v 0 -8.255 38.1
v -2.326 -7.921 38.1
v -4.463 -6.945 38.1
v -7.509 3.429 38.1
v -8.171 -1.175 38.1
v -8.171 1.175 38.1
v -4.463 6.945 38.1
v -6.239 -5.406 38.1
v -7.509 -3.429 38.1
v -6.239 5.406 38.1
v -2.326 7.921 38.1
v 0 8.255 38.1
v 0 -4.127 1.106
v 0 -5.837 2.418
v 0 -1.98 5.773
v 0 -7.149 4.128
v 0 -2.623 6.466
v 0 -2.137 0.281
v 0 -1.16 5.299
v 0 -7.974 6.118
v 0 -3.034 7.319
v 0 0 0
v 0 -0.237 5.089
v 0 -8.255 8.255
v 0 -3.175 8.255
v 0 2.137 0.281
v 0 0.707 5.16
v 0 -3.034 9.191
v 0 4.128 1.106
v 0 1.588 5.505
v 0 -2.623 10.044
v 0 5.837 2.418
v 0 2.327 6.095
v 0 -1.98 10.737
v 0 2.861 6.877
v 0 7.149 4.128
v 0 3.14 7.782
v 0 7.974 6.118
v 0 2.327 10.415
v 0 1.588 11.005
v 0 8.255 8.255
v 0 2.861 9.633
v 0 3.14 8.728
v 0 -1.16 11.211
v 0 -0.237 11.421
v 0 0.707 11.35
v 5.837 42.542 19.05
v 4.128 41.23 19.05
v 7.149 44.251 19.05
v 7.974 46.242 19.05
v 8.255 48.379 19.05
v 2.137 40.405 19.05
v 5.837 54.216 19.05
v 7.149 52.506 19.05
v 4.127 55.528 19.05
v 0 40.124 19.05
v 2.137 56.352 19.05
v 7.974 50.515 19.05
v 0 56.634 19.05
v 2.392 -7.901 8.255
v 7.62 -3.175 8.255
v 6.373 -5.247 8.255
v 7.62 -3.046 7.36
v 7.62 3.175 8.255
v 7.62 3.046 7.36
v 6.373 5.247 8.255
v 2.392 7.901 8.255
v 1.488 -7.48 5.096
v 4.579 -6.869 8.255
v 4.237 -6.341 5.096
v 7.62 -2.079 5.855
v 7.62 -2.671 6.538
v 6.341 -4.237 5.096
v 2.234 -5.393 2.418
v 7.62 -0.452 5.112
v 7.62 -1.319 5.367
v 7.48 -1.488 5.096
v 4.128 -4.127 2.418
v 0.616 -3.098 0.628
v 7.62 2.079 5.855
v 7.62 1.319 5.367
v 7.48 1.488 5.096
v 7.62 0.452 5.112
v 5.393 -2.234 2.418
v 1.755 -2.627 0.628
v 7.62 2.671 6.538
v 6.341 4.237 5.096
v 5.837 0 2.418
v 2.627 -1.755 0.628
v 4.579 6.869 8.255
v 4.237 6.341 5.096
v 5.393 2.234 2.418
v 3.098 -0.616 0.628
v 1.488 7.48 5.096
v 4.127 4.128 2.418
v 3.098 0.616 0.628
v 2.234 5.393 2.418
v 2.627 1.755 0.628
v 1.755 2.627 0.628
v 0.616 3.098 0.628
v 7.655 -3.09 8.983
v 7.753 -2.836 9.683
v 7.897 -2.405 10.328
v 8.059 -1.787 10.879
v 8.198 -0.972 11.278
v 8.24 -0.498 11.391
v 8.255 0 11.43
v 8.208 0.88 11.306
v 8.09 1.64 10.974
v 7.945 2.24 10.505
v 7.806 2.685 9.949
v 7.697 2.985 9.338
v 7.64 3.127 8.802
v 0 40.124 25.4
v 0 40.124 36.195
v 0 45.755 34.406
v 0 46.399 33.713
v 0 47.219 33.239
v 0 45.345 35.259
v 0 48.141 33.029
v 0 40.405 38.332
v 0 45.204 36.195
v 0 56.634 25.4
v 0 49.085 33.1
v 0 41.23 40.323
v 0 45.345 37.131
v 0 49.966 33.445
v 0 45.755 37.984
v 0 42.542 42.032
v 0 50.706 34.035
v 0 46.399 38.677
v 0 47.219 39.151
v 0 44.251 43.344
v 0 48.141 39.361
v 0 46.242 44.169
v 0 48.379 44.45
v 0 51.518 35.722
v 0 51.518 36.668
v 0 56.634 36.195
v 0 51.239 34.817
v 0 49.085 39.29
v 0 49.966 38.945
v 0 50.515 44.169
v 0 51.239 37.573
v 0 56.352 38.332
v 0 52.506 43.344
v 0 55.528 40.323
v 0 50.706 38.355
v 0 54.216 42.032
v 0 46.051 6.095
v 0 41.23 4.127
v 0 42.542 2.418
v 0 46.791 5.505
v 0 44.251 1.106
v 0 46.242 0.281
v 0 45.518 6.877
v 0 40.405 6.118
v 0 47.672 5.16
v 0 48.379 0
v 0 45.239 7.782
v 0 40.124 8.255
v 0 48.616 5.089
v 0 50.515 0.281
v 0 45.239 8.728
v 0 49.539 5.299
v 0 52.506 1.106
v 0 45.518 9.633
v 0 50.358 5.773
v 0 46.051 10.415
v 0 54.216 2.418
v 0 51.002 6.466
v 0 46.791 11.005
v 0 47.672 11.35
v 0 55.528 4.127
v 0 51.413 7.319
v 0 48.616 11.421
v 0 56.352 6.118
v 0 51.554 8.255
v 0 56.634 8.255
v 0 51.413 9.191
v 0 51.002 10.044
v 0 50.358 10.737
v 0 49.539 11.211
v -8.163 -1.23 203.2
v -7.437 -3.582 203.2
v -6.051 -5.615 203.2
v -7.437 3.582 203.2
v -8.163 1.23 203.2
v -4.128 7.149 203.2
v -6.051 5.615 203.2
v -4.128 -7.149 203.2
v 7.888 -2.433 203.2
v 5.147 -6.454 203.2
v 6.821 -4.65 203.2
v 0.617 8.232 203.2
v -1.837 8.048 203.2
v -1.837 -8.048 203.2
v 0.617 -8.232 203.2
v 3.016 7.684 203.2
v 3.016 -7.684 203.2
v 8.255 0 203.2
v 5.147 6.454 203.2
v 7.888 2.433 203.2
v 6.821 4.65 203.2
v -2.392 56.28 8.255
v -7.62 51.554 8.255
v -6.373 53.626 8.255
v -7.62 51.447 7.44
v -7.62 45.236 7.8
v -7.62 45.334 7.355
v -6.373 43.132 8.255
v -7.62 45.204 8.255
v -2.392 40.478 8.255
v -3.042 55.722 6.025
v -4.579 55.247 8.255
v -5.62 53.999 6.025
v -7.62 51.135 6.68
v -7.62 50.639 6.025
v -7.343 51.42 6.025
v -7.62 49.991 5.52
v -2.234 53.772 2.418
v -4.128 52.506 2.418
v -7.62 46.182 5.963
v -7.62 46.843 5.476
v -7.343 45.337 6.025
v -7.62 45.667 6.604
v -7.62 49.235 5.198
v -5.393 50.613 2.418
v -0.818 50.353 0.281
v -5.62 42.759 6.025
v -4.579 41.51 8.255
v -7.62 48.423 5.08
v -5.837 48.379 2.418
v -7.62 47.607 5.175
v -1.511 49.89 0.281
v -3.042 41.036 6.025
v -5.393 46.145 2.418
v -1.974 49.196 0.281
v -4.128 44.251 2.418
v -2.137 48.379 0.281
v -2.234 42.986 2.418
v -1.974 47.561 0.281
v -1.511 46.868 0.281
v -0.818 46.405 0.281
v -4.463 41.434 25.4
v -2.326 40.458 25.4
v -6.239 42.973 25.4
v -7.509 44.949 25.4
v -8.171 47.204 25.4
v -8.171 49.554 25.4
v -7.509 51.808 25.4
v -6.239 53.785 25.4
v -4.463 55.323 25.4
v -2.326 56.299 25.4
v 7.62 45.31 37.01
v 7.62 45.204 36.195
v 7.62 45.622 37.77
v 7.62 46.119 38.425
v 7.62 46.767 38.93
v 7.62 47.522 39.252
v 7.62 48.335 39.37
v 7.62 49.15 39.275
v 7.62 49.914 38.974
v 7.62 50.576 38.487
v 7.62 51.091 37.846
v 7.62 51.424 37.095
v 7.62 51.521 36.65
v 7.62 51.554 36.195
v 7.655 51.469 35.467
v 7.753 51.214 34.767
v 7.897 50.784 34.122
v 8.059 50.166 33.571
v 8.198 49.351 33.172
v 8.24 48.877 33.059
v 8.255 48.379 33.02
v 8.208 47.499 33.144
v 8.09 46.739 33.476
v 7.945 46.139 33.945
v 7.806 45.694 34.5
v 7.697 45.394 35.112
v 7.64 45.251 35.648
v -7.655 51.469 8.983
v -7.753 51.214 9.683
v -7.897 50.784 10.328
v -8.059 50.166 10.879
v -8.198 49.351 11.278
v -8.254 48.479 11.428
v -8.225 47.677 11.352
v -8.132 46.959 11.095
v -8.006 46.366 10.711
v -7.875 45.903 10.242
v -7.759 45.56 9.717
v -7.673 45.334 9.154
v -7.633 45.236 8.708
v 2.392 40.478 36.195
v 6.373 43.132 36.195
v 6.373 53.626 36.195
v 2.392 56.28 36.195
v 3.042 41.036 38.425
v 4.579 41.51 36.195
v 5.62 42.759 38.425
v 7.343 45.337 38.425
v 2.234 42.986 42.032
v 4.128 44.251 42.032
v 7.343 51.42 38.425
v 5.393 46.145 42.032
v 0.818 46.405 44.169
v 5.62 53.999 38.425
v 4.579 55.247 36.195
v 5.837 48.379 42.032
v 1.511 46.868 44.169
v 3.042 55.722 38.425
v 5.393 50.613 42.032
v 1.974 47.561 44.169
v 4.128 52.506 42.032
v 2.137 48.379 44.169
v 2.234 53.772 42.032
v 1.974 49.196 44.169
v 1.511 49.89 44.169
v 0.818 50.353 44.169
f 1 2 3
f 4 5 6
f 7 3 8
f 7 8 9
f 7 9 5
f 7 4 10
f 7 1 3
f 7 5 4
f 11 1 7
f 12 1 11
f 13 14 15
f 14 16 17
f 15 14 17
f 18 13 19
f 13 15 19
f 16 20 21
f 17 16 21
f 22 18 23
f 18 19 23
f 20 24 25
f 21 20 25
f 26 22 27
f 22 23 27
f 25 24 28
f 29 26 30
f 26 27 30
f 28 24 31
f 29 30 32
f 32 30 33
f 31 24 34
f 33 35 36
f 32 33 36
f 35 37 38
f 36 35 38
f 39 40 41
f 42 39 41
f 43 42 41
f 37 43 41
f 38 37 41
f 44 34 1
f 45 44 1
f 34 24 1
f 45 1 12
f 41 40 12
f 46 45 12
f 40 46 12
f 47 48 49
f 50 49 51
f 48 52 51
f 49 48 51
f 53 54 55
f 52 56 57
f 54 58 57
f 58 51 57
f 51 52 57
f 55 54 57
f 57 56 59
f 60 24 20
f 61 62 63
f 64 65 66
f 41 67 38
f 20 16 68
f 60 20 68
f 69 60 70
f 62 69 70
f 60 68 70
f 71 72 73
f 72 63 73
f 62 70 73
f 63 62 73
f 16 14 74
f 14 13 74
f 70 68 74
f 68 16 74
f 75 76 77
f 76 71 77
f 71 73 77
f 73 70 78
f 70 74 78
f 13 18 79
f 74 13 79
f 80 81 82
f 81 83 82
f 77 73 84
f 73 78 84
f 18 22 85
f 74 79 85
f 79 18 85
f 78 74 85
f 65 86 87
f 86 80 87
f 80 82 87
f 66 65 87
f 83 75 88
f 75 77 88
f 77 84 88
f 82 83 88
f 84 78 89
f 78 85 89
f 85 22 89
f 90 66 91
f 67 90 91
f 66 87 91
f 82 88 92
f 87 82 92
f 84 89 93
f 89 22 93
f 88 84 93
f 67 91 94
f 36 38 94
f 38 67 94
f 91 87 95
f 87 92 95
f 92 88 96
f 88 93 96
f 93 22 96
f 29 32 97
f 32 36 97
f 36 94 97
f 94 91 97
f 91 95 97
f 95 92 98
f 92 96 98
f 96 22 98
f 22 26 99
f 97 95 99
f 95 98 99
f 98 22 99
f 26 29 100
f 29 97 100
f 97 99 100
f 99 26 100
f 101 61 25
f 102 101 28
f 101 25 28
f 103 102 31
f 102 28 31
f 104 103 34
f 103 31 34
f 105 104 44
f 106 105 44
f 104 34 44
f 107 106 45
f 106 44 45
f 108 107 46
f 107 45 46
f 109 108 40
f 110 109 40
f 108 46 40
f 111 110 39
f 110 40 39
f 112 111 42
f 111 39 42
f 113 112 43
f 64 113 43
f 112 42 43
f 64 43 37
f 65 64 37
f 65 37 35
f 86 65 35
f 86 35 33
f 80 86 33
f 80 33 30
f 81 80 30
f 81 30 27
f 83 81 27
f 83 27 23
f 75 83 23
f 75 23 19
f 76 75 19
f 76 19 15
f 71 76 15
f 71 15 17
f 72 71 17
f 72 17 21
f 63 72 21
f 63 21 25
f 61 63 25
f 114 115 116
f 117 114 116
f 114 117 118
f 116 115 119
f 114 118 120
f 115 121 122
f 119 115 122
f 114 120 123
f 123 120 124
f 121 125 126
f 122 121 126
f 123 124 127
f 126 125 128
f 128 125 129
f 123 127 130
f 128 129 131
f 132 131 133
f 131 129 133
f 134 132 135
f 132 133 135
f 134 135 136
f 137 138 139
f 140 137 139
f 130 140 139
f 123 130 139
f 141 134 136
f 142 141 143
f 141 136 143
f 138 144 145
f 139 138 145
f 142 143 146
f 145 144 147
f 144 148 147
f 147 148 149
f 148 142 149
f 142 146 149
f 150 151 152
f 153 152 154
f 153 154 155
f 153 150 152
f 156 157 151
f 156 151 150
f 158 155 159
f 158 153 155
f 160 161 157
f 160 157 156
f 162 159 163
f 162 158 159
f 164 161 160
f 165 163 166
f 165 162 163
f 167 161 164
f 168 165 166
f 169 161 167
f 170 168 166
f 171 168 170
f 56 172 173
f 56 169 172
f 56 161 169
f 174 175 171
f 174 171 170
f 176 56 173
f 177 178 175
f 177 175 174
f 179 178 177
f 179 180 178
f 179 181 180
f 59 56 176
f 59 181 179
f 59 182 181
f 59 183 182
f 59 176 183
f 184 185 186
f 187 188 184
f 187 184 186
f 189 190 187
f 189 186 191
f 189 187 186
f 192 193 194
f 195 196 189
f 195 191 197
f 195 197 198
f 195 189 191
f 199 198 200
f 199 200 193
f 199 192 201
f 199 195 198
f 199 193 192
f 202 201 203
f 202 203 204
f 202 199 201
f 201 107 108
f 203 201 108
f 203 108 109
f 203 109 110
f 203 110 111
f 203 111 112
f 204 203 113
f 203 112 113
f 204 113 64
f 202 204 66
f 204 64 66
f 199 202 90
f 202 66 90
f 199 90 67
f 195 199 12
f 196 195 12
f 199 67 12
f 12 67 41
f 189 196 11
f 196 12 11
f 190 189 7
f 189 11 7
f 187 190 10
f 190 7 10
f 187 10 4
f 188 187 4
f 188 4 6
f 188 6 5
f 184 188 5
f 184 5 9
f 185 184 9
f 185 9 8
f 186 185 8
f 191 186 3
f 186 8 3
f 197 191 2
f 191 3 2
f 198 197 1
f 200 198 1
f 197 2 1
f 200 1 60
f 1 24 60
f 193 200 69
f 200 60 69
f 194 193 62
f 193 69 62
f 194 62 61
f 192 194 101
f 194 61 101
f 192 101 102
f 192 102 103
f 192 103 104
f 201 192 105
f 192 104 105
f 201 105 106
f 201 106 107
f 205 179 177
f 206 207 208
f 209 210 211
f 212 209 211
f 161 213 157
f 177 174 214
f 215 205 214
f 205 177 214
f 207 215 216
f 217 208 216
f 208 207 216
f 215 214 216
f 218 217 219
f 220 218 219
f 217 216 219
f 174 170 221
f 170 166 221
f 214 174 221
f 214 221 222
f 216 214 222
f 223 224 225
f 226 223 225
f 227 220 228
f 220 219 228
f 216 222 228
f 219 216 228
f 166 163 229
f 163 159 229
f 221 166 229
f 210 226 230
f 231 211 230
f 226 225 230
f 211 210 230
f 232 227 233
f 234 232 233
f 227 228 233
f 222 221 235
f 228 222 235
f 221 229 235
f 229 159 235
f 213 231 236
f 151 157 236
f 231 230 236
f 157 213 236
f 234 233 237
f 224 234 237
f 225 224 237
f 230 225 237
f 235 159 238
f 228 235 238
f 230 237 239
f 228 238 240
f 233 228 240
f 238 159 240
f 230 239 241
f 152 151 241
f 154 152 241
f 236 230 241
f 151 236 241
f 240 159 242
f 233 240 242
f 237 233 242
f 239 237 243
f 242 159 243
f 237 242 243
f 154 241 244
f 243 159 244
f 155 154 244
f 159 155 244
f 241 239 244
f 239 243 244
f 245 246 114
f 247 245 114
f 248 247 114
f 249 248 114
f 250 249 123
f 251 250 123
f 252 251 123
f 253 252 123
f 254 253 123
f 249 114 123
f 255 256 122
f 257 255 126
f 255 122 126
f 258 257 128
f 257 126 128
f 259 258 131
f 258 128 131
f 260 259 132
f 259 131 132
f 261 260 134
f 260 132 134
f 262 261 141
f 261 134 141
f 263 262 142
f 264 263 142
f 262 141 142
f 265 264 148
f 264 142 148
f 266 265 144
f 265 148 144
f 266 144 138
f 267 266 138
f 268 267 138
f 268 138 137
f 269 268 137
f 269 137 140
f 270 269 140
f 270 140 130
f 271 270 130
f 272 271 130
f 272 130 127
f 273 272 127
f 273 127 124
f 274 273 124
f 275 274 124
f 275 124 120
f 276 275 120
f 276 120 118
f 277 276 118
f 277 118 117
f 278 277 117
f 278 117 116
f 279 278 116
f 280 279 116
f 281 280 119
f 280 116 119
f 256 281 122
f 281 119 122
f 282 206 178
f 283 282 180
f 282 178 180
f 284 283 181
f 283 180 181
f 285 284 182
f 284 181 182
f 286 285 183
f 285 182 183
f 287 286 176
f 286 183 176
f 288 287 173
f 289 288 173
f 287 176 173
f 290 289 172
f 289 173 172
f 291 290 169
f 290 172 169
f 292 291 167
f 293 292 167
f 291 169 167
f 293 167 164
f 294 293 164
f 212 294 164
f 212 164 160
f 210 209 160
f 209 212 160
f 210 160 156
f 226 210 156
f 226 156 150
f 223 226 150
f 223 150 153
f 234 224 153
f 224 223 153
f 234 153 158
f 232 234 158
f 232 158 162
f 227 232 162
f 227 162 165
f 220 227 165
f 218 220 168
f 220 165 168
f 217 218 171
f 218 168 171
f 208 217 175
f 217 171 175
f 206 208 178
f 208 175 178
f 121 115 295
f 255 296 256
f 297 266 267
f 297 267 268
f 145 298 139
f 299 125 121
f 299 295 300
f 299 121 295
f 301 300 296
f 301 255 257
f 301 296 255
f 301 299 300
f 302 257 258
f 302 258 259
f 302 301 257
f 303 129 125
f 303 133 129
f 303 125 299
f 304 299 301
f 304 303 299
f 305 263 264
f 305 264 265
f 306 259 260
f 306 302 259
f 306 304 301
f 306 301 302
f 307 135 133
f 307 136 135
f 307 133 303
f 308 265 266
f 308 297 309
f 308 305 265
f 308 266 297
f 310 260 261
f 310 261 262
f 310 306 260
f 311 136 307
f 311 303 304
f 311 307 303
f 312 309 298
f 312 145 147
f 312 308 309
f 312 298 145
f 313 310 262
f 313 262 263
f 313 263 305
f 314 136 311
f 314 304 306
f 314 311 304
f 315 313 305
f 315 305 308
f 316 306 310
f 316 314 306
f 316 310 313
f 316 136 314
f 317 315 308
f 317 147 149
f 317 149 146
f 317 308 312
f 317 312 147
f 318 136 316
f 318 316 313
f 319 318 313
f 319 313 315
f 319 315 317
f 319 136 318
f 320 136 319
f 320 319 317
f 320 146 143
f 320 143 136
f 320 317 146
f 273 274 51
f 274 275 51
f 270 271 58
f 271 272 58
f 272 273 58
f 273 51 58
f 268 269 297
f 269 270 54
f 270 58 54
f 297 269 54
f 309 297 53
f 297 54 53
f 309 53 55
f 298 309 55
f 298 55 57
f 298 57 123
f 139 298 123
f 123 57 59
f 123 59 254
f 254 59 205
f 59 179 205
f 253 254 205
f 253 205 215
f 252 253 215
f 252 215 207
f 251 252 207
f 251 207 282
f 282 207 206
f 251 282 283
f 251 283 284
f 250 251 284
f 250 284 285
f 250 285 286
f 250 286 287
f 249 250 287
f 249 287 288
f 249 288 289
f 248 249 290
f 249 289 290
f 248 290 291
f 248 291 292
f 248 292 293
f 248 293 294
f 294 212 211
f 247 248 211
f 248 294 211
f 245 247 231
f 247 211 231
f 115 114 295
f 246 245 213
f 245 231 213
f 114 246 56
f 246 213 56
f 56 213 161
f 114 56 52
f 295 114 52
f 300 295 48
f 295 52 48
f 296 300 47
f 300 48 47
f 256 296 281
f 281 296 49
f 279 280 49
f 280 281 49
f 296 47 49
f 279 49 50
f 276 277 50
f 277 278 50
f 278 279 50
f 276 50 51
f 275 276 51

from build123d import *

# Parameters (mm, degrees)
F0_R      = 8.255
F1_DEPTH  = 203.2
F2_R      = 8.255
F3_W      = 65.5652643557
F3_H      = 67.8089395726
F4_DEPTH  = 25.4
F5_R      = 3.175
F6_DEPTH  = 25.4
F7_R      = 8.255
F8_DEPTH  = 44.45
F9_W      = 28.5546391179
F9_H      = 24.6901003341
F10_DEPTH = 25.4
F11_R     = 8.25499
F12_R     = 3.175
F13_DEPTH = 25.4
F14_W     = 34.453469107
F14_H     = 29.3156715315
F15_DEPTH = 25.4
F16_R     = 8.25499
F17_R     = 3.175
F18_DEPTH = 25.4


# Not quite as in the source:
# - a fillet or chamfer is up to 0.001 mm smaller than in the source, because OpenCascade refuses the exact size


with BuildPart() as f1:
    # F0 (on Top) → F1 (new body)
    with BuildSketch(Plane.XY):
        Circle(F0_R)
    extrude(amount=F1_DEPTH)

    # F2
    f2_edges = [f1.edges().sort_by_distance(p)[0] for p in [
        (-8.255, 0, 0),
    ]]
    fillet(f2_edges, radius=F2_R)

    # F3 (on Right) → F4 (cut)
    with BuildSketch(Plane.YZ):
        with Locations((-3.3156136051, 4.1955302137)):
            Rectangle(F3_W, F3_H)
    extrude(amount=-F4_DEPTH, mode=Mode.SUBTRACT)

    # F5 (on face) → F6 (cut)
    with BuildSketch(Plane(origin=(0, 0, 0), x_dir=(0, -1, 0), z_dir=(-1, 0, 0))):
        with Locations((0, 8.255)):
            Circle(F5_R)
    extrude(amount=-F6_DEPTH, mode=Mode.SUBTRACT)


with BuildPart() as f8:
    # F7 (on Top) → F8 (new body)
    with BuildSketch(Plane.XY):
        with Locations((0, 48.3787283301)):
            Circle(F7_R)
    extrude(amount=F8_DEPTH)

    # F9 (on Right) → F10 (cut)
    with BuildSketch(Plane.YZ):
        with Locations((48.8578211516, 37.745050167)):
            Rectangle(F9_W, F9_H)
    extrude(amount=-F10_DEPTH, mode=Mode.SUBTRACT)

    # F11 (radius 8.255 in the source; OpenCascade refuses exactly that, so slightly less here)
    f11_edges = [f8.edges().sort_by_distance(p)[0] for p in [
        (5.837166, 42.541562, 44.45),
        (5.837166, 54.215895, 44.45),
    ]]
    fillet(f11_edges, radius=F11_R)

    # F12 (on face) → F13 (cut)
    with BuildSketch(Plane(origin=(0, 0, 0), x_dir=(0, -1, 0), z_dir=(-1, 0, 0))):
        with Locations((-48.3787283301, 36.195)):
            Circle(F12_R)
    extrude(amount=-F13_DEPTH, mode=Mode.SUBTRACT)

    # F14 (on Right) → F15 (cut)
    with BuildSketch(Plane.YZ):
        with Locations((49.3318922818, 4.3921642342)):
            Rectangle(F14_W, F14_H)
    extrude(amount=F15_DEPTH, mode=Mode.SUBTRACT)

    # F16 (radius 8.255 in the source; OpenCascade refuses exactly that, so slightly less here)
    f16_edges = [f8.edges().sort_by_distance(p)[0] for p in [
        (-8.255, 48.378728, 0),
    ]]
    fillet(f16_edges, radius=F16_R)

    # F17 (on face) → F18 (cut)
    with BuildSketch(Plane.YZ):
        with Locations((48.3787283301, 8.255)):
            Circle(F17_R)
    extrude(amount=-F18_DEPTH, mode=Mode.SUBTRACT)


solid = Compound([f1.part, f8.part])
